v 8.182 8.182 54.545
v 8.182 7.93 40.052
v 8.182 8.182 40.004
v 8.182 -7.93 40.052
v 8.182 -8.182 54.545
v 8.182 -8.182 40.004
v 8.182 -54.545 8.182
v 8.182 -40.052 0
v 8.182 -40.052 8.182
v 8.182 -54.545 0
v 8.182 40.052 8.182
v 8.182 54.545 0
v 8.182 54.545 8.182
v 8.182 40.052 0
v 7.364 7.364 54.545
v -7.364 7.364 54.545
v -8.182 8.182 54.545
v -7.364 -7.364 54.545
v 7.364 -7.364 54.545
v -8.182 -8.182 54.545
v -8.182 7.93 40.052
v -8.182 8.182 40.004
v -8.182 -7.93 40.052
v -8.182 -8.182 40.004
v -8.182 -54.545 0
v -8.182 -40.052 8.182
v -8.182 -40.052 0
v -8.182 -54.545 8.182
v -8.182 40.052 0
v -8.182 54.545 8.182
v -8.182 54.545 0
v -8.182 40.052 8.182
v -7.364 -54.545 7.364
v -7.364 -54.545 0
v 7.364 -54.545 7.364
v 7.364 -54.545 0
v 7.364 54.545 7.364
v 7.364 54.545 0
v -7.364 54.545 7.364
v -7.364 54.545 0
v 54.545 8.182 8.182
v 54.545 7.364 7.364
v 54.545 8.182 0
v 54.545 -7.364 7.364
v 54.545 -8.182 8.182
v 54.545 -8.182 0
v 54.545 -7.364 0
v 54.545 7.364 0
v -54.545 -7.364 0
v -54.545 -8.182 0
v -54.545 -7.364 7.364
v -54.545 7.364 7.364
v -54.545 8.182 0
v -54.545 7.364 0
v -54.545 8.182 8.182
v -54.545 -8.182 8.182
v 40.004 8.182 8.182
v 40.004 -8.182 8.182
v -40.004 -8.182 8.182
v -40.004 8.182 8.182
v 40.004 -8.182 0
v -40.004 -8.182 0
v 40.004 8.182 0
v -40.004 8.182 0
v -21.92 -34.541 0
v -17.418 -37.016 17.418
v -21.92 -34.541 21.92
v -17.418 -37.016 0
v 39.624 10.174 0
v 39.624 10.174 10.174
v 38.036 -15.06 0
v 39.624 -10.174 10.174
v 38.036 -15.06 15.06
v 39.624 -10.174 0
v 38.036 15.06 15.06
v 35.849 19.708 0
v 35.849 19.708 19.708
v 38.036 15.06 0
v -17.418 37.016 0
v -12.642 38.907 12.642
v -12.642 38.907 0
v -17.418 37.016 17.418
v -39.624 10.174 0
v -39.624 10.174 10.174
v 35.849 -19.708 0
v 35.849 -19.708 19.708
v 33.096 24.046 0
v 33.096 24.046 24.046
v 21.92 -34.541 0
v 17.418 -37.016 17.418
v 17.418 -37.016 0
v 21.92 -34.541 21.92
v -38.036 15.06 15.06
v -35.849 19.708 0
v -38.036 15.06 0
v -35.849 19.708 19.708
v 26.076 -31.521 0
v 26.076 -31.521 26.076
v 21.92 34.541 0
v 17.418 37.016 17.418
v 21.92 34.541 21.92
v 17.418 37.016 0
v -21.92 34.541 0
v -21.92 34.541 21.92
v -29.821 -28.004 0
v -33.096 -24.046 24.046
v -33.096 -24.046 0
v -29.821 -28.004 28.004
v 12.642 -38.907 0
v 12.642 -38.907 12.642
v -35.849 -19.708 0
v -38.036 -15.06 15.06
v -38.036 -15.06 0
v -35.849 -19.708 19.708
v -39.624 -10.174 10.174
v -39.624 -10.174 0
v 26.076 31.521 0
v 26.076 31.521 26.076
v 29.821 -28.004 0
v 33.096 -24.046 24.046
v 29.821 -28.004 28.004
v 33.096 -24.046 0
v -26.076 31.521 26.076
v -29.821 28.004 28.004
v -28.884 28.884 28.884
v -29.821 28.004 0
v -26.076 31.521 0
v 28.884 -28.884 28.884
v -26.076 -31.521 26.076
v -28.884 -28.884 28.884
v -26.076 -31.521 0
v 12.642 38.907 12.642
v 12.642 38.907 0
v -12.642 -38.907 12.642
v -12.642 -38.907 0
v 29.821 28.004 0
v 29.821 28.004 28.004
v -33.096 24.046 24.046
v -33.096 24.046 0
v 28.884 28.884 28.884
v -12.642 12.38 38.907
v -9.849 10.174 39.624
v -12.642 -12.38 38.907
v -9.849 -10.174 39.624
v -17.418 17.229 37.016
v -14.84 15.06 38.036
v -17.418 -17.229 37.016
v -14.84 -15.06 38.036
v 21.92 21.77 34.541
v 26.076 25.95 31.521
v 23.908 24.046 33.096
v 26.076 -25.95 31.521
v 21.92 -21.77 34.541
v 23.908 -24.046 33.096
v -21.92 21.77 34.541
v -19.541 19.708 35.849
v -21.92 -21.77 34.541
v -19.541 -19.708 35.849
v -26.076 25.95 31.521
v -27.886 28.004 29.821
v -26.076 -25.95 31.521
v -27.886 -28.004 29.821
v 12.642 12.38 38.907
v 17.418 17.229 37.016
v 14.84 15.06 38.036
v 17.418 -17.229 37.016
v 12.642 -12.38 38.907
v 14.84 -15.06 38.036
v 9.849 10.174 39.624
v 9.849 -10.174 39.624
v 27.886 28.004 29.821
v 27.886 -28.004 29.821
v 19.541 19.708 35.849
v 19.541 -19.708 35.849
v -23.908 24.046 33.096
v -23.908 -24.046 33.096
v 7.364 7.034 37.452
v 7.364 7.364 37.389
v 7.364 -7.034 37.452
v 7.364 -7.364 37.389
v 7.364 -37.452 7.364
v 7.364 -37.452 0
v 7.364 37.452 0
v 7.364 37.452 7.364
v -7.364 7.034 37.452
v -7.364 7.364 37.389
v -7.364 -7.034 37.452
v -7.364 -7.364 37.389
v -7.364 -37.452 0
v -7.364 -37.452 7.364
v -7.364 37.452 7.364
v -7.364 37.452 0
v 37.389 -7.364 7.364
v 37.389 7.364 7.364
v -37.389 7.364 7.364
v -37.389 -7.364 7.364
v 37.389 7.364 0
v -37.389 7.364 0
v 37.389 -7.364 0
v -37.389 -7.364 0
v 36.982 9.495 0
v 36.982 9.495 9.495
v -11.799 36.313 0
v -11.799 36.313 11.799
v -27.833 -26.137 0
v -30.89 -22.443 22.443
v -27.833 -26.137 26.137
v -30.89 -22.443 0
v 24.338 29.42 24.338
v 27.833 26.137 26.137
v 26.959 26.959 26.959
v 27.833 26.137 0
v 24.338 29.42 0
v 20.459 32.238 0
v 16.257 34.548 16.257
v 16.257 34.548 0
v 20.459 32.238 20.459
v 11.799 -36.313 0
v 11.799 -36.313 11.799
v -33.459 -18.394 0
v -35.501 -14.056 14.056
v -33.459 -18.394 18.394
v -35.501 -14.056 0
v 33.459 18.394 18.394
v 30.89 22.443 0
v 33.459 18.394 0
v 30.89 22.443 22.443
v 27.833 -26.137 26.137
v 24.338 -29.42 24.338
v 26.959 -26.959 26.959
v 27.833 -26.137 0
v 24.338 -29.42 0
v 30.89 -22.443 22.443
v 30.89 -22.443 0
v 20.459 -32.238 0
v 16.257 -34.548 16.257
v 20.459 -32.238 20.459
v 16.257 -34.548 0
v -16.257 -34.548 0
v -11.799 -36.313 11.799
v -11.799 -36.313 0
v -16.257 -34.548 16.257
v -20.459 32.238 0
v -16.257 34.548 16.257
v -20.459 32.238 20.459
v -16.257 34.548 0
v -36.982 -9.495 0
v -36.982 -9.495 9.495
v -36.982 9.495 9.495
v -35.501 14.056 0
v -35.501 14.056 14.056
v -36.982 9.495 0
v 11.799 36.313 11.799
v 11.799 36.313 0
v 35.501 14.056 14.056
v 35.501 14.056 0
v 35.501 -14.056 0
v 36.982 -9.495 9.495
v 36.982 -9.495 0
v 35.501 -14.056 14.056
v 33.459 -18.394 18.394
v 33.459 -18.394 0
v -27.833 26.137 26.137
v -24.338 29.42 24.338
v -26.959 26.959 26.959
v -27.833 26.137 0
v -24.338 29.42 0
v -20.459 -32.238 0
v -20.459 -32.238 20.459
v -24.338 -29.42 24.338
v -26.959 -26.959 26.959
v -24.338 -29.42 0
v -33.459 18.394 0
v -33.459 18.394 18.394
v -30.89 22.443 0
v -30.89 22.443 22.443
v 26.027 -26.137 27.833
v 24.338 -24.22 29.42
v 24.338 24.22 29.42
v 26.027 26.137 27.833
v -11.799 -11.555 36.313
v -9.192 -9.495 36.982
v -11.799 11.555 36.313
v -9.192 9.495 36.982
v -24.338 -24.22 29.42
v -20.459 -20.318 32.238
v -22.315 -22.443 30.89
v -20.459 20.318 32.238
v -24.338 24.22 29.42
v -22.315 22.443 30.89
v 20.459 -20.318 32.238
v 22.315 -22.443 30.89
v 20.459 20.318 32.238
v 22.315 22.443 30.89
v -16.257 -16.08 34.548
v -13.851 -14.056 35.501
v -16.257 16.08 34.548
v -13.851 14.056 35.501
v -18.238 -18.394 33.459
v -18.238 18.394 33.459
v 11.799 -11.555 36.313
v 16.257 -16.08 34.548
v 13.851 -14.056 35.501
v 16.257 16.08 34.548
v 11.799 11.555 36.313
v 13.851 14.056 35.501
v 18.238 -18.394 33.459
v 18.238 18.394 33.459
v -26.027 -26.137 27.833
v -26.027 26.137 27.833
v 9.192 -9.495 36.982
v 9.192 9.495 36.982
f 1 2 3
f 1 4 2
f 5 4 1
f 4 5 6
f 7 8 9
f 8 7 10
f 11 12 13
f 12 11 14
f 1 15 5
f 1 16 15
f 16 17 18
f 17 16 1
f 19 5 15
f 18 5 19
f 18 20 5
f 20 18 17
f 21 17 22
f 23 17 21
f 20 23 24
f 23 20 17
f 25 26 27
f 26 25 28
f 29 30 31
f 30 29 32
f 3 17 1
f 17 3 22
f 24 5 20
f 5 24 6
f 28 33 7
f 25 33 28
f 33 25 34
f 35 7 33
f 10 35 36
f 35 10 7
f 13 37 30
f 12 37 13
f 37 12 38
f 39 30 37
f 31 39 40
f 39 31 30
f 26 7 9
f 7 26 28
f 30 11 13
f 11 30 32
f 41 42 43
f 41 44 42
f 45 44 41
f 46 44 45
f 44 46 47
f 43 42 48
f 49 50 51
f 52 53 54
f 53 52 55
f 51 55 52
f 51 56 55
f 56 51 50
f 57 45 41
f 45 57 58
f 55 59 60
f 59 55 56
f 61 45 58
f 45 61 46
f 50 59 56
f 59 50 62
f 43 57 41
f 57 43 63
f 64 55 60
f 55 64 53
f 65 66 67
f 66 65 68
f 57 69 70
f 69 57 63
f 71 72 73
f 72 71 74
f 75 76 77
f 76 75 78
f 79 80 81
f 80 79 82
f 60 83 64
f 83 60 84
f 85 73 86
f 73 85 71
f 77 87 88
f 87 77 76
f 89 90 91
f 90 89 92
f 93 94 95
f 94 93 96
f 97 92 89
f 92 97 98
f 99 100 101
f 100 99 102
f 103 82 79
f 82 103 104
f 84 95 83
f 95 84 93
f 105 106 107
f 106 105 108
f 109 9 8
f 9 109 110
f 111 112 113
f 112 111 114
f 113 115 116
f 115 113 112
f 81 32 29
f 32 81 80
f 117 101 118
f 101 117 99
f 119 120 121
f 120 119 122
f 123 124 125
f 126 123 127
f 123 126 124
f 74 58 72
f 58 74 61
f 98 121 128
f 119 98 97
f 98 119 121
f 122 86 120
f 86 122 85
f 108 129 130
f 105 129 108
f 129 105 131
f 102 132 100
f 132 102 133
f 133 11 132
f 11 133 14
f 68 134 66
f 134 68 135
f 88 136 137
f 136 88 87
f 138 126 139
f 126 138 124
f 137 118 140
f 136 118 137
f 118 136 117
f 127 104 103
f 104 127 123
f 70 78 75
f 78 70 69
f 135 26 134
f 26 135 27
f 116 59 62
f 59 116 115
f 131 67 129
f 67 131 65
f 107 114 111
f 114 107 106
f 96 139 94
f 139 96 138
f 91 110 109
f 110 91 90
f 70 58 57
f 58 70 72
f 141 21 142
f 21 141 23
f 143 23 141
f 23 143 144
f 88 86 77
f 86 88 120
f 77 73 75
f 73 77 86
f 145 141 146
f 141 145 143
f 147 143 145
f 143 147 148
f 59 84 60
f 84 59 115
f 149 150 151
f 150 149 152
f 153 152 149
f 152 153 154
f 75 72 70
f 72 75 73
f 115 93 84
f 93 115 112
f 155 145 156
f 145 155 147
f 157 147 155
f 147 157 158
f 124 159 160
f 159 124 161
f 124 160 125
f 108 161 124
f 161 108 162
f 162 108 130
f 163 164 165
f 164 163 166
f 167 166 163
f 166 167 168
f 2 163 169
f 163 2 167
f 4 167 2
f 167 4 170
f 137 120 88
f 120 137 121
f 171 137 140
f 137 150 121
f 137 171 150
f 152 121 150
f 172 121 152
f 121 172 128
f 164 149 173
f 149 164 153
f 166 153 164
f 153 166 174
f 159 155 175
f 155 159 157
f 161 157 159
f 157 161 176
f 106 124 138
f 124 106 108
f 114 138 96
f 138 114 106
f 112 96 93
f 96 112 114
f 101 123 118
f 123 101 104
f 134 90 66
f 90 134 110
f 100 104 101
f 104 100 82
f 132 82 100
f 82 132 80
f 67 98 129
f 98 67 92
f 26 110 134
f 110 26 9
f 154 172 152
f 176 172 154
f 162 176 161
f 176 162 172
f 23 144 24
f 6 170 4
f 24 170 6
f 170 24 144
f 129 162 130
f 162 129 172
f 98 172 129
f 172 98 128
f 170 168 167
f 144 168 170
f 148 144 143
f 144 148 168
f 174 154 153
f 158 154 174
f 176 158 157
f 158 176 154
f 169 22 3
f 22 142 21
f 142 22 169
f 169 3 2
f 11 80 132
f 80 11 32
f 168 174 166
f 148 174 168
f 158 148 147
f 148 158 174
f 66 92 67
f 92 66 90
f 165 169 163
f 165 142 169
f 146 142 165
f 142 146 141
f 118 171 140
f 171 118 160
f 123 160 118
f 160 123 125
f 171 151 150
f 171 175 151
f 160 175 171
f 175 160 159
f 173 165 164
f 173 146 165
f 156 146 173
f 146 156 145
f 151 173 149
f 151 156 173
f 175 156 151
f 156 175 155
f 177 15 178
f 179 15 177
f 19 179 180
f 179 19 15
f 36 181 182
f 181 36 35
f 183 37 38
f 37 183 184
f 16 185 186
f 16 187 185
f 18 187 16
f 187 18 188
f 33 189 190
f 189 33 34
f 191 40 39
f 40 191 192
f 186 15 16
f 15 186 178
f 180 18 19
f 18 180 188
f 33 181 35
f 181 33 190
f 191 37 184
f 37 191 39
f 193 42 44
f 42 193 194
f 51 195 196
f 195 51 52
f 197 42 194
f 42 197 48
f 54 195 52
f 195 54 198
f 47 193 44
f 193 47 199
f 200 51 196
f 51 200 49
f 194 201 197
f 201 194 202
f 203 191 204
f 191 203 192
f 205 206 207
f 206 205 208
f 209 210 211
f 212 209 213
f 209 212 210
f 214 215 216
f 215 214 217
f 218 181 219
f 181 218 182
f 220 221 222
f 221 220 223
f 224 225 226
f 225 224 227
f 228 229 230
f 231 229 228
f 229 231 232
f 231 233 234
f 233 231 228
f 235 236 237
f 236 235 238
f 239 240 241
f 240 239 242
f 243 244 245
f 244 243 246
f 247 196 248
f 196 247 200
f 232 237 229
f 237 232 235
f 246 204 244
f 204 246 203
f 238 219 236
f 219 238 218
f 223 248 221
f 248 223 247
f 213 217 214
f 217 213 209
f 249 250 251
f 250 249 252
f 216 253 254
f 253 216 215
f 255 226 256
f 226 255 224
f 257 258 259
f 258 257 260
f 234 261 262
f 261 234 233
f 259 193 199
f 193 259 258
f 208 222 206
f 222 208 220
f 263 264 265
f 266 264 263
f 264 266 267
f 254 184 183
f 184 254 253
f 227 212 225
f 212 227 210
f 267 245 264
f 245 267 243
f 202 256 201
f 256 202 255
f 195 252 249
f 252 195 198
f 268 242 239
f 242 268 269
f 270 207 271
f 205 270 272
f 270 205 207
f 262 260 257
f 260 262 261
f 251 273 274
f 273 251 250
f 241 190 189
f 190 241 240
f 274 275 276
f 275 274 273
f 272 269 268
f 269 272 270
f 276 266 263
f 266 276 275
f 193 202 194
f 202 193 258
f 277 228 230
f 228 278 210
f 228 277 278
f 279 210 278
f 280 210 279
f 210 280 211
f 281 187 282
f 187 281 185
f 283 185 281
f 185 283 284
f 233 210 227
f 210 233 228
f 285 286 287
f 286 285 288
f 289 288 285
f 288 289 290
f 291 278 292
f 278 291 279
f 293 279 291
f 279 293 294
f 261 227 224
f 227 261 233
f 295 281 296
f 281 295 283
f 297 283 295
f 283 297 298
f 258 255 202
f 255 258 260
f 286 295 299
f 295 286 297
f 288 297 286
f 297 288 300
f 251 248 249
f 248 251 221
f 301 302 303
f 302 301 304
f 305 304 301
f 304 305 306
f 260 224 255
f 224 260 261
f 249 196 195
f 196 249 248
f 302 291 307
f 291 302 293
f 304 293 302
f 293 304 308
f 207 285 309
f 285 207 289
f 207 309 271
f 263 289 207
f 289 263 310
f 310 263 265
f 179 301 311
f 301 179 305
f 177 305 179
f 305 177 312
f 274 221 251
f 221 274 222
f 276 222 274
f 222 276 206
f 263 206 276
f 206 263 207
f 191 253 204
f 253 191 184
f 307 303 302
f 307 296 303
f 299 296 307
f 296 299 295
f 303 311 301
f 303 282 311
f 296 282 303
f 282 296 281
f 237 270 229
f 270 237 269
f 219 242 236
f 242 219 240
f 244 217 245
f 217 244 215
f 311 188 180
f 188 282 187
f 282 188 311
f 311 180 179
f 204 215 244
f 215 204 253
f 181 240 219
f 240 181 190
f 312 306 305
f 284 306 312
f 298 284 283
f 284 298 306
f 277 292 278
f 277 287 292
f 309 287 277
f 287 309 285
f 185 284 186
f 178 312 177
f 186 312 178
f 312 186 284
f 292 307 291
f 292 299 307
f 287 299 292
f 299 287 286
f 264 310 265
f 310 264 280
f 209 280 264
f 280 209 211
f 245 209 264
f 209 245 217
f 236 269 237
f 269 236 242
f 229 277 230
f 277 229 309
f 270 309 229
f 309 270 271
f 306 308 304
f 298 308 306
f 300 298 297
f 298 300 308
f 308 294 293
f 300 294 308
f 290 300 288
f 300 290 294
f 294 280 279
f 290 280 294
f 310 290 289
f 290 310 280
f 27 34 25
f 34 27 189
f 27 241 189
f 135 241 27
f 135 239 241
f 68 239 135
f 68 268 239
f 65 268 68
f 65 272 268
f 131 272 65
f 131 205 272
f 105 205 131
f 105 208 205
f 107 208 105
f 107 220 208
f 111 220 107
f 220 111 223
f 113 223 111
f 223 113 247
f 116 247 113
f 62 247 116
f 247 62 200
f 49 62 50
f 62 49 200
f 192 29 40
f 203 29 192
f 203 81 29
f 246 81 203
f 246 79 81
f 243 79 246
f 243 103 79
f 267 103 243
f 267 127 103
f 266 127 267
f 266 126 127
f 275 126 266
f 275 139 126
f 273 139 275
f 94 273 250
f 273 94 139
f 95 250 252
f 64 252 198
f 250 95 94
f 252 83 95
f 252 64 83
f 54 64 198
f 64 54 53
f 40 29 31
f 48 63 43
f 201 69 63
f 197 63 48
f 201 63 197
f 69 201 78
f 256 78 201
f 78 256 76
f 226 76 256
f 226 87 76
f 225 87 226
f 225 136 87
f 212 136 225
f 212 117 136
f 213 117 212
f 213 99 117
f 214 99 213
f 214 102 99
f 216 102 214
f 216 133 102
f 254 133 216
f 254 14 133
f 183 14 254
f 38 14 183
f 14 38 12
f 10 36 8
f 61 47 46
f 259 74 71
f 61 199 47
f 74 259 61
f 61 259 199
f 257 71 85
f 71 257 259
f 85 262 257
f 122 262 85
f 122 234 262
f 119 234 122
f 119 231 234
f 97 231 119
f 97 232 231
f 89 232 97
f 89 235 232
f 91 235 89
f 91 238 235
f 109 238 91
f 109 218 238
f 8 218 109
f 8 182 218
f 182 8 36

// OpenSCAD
// file: variables.scad
$fn=50;

scale_factor = 300/55;

CUBIE=18.9*scale_factor; //total side length of each cube piece (including rounded edges)
CORE=18*scale_factor;
SCREW_TIP=1.5*scale_factor;
SCREW_BODY=2*scale_factor;
SCREW_HEAD=3.8*scale_factor;
INNER=4.5*scale_factor;
SPRING=3.2*scale_factor;
ROUND=2*scale_factor; //radius of rounded edges
DEPTH=6*scale_factor;
RAFT=5*scale_factor;
LAYER=0.3*scale_factor;
GAP=0.25*scale_factor;

core_height = 20 * scale_factor;
core_radius = 3 * scale_factor;

WITH_SUPPORT=false;
WITH_RAFT=false;

inner_cubie=(CUBIE-2*ROUND); //length of each cube before rounded edges

tile_length = inner_cubie*0.75;
tile_height = 1 * scale_factor;

module tile(length, height) {
	translate([-length/2,-length/2,0]) {
		minkowski(){
			translate([0,0,-height/2]) cube([length,length,height]);
			cylinder(r=ROUND,h=height,center=true);
		}
	}
	
}

module cubie() {
    translate([-inner_cubie/2,-inner_cubie/2, -inner_cubie/2])
    minkowski() {
        cube([inner_cubie, inner_cubie, inner_cubie]);
        sphere(r=ROUND, $fn=10);
    }
}

module disc() {
    cylinder(CUBIE, r1=CORE, r2=CORE, $fn=50, center=true);

}

module disc2() {
    cylinder(CUBIE*10, r1=CORE, r2=CORE, $fn=50, center=true);

}

module icore() {
    disc();
    rotate([0,90,0])
        disc();
    rotate([90,0,0])
        disc();
}

module core2() {
    intersection() {
        disc2();
        rotate([0,90,0])
            disc2();
        rotate([90,0,0])
            disc2();
    }
}

module screw() {
    translate([5.2,0,0])
    rotate([0,90,0]) {
        cylinder(11.7,r1=SCREW_BODY,r2=SCREW_BODY,$fn=10,center=true);
        translate([0,0,-11.7/2-1.7/2])
            cylinder(1.7,r1=SCREW_HEAD,r2=SCREW_HEAD,$fn=10,center=true);
        translate([0,0,11.7/2+5.7/2])
            cylinder(5.7,r1=SCREW_TIP,r2=SCREW_TIP,$fn=10,center=true);
    }
}
// main file
include <variables.scad>

module cylinder_sphere(height) {
	intersection() {
		cylinder(h=height, r=height/2, center=true);
		rotate(a=90, v=[1,0,0]) cylinder(h=height, r=height/2, center=true);
		rotate(a=90, v=[0,1,0]) cylinder(h=height, r=height/2, center=true);
	}
}

module core_shape_cylinders(height, radius) {
	cylinder(h=height,r=radius,center=true);
	rotate(a=90,v=[1,0,0]) cylinder(h=height,r=radius,center=true);
	rotate(a=90,v=[0,1,0]) cylinder(h=height,r=radius,center=true);
}

module core_shape(height, radius){
    cube([radius,radius,height],center=true);
	rotate(a=90,v=[1,0,0]) cube([radius,radius,height],center=true);
	rotate(a=90,v=[0,1,0]) cube([radius,radius,height],center=true);
}

module core_filled_in() {
	core_shape(core_height, core_radius);
	cylinder_sphere(core_height*0.75);
}


module core_hollow_part() {
	core_shape(core_height, core_radius*0.9);
	cylinder_sphere(core_height*0.7);
}

module core() {
	difference() {
		core_filled_in();
		core_hollow_part();
	}
}

/*
code to show the core and the inside of the core

difference() {
    core();
    cube([core_height/2,core_height/2,core_height/2]);
}*/

module core_half() {
    difference() {
        core();
        translate([0,0,-core_height/4])cube([core_height,core_height,core_height/2],center=true);
    }
}



core_half();
